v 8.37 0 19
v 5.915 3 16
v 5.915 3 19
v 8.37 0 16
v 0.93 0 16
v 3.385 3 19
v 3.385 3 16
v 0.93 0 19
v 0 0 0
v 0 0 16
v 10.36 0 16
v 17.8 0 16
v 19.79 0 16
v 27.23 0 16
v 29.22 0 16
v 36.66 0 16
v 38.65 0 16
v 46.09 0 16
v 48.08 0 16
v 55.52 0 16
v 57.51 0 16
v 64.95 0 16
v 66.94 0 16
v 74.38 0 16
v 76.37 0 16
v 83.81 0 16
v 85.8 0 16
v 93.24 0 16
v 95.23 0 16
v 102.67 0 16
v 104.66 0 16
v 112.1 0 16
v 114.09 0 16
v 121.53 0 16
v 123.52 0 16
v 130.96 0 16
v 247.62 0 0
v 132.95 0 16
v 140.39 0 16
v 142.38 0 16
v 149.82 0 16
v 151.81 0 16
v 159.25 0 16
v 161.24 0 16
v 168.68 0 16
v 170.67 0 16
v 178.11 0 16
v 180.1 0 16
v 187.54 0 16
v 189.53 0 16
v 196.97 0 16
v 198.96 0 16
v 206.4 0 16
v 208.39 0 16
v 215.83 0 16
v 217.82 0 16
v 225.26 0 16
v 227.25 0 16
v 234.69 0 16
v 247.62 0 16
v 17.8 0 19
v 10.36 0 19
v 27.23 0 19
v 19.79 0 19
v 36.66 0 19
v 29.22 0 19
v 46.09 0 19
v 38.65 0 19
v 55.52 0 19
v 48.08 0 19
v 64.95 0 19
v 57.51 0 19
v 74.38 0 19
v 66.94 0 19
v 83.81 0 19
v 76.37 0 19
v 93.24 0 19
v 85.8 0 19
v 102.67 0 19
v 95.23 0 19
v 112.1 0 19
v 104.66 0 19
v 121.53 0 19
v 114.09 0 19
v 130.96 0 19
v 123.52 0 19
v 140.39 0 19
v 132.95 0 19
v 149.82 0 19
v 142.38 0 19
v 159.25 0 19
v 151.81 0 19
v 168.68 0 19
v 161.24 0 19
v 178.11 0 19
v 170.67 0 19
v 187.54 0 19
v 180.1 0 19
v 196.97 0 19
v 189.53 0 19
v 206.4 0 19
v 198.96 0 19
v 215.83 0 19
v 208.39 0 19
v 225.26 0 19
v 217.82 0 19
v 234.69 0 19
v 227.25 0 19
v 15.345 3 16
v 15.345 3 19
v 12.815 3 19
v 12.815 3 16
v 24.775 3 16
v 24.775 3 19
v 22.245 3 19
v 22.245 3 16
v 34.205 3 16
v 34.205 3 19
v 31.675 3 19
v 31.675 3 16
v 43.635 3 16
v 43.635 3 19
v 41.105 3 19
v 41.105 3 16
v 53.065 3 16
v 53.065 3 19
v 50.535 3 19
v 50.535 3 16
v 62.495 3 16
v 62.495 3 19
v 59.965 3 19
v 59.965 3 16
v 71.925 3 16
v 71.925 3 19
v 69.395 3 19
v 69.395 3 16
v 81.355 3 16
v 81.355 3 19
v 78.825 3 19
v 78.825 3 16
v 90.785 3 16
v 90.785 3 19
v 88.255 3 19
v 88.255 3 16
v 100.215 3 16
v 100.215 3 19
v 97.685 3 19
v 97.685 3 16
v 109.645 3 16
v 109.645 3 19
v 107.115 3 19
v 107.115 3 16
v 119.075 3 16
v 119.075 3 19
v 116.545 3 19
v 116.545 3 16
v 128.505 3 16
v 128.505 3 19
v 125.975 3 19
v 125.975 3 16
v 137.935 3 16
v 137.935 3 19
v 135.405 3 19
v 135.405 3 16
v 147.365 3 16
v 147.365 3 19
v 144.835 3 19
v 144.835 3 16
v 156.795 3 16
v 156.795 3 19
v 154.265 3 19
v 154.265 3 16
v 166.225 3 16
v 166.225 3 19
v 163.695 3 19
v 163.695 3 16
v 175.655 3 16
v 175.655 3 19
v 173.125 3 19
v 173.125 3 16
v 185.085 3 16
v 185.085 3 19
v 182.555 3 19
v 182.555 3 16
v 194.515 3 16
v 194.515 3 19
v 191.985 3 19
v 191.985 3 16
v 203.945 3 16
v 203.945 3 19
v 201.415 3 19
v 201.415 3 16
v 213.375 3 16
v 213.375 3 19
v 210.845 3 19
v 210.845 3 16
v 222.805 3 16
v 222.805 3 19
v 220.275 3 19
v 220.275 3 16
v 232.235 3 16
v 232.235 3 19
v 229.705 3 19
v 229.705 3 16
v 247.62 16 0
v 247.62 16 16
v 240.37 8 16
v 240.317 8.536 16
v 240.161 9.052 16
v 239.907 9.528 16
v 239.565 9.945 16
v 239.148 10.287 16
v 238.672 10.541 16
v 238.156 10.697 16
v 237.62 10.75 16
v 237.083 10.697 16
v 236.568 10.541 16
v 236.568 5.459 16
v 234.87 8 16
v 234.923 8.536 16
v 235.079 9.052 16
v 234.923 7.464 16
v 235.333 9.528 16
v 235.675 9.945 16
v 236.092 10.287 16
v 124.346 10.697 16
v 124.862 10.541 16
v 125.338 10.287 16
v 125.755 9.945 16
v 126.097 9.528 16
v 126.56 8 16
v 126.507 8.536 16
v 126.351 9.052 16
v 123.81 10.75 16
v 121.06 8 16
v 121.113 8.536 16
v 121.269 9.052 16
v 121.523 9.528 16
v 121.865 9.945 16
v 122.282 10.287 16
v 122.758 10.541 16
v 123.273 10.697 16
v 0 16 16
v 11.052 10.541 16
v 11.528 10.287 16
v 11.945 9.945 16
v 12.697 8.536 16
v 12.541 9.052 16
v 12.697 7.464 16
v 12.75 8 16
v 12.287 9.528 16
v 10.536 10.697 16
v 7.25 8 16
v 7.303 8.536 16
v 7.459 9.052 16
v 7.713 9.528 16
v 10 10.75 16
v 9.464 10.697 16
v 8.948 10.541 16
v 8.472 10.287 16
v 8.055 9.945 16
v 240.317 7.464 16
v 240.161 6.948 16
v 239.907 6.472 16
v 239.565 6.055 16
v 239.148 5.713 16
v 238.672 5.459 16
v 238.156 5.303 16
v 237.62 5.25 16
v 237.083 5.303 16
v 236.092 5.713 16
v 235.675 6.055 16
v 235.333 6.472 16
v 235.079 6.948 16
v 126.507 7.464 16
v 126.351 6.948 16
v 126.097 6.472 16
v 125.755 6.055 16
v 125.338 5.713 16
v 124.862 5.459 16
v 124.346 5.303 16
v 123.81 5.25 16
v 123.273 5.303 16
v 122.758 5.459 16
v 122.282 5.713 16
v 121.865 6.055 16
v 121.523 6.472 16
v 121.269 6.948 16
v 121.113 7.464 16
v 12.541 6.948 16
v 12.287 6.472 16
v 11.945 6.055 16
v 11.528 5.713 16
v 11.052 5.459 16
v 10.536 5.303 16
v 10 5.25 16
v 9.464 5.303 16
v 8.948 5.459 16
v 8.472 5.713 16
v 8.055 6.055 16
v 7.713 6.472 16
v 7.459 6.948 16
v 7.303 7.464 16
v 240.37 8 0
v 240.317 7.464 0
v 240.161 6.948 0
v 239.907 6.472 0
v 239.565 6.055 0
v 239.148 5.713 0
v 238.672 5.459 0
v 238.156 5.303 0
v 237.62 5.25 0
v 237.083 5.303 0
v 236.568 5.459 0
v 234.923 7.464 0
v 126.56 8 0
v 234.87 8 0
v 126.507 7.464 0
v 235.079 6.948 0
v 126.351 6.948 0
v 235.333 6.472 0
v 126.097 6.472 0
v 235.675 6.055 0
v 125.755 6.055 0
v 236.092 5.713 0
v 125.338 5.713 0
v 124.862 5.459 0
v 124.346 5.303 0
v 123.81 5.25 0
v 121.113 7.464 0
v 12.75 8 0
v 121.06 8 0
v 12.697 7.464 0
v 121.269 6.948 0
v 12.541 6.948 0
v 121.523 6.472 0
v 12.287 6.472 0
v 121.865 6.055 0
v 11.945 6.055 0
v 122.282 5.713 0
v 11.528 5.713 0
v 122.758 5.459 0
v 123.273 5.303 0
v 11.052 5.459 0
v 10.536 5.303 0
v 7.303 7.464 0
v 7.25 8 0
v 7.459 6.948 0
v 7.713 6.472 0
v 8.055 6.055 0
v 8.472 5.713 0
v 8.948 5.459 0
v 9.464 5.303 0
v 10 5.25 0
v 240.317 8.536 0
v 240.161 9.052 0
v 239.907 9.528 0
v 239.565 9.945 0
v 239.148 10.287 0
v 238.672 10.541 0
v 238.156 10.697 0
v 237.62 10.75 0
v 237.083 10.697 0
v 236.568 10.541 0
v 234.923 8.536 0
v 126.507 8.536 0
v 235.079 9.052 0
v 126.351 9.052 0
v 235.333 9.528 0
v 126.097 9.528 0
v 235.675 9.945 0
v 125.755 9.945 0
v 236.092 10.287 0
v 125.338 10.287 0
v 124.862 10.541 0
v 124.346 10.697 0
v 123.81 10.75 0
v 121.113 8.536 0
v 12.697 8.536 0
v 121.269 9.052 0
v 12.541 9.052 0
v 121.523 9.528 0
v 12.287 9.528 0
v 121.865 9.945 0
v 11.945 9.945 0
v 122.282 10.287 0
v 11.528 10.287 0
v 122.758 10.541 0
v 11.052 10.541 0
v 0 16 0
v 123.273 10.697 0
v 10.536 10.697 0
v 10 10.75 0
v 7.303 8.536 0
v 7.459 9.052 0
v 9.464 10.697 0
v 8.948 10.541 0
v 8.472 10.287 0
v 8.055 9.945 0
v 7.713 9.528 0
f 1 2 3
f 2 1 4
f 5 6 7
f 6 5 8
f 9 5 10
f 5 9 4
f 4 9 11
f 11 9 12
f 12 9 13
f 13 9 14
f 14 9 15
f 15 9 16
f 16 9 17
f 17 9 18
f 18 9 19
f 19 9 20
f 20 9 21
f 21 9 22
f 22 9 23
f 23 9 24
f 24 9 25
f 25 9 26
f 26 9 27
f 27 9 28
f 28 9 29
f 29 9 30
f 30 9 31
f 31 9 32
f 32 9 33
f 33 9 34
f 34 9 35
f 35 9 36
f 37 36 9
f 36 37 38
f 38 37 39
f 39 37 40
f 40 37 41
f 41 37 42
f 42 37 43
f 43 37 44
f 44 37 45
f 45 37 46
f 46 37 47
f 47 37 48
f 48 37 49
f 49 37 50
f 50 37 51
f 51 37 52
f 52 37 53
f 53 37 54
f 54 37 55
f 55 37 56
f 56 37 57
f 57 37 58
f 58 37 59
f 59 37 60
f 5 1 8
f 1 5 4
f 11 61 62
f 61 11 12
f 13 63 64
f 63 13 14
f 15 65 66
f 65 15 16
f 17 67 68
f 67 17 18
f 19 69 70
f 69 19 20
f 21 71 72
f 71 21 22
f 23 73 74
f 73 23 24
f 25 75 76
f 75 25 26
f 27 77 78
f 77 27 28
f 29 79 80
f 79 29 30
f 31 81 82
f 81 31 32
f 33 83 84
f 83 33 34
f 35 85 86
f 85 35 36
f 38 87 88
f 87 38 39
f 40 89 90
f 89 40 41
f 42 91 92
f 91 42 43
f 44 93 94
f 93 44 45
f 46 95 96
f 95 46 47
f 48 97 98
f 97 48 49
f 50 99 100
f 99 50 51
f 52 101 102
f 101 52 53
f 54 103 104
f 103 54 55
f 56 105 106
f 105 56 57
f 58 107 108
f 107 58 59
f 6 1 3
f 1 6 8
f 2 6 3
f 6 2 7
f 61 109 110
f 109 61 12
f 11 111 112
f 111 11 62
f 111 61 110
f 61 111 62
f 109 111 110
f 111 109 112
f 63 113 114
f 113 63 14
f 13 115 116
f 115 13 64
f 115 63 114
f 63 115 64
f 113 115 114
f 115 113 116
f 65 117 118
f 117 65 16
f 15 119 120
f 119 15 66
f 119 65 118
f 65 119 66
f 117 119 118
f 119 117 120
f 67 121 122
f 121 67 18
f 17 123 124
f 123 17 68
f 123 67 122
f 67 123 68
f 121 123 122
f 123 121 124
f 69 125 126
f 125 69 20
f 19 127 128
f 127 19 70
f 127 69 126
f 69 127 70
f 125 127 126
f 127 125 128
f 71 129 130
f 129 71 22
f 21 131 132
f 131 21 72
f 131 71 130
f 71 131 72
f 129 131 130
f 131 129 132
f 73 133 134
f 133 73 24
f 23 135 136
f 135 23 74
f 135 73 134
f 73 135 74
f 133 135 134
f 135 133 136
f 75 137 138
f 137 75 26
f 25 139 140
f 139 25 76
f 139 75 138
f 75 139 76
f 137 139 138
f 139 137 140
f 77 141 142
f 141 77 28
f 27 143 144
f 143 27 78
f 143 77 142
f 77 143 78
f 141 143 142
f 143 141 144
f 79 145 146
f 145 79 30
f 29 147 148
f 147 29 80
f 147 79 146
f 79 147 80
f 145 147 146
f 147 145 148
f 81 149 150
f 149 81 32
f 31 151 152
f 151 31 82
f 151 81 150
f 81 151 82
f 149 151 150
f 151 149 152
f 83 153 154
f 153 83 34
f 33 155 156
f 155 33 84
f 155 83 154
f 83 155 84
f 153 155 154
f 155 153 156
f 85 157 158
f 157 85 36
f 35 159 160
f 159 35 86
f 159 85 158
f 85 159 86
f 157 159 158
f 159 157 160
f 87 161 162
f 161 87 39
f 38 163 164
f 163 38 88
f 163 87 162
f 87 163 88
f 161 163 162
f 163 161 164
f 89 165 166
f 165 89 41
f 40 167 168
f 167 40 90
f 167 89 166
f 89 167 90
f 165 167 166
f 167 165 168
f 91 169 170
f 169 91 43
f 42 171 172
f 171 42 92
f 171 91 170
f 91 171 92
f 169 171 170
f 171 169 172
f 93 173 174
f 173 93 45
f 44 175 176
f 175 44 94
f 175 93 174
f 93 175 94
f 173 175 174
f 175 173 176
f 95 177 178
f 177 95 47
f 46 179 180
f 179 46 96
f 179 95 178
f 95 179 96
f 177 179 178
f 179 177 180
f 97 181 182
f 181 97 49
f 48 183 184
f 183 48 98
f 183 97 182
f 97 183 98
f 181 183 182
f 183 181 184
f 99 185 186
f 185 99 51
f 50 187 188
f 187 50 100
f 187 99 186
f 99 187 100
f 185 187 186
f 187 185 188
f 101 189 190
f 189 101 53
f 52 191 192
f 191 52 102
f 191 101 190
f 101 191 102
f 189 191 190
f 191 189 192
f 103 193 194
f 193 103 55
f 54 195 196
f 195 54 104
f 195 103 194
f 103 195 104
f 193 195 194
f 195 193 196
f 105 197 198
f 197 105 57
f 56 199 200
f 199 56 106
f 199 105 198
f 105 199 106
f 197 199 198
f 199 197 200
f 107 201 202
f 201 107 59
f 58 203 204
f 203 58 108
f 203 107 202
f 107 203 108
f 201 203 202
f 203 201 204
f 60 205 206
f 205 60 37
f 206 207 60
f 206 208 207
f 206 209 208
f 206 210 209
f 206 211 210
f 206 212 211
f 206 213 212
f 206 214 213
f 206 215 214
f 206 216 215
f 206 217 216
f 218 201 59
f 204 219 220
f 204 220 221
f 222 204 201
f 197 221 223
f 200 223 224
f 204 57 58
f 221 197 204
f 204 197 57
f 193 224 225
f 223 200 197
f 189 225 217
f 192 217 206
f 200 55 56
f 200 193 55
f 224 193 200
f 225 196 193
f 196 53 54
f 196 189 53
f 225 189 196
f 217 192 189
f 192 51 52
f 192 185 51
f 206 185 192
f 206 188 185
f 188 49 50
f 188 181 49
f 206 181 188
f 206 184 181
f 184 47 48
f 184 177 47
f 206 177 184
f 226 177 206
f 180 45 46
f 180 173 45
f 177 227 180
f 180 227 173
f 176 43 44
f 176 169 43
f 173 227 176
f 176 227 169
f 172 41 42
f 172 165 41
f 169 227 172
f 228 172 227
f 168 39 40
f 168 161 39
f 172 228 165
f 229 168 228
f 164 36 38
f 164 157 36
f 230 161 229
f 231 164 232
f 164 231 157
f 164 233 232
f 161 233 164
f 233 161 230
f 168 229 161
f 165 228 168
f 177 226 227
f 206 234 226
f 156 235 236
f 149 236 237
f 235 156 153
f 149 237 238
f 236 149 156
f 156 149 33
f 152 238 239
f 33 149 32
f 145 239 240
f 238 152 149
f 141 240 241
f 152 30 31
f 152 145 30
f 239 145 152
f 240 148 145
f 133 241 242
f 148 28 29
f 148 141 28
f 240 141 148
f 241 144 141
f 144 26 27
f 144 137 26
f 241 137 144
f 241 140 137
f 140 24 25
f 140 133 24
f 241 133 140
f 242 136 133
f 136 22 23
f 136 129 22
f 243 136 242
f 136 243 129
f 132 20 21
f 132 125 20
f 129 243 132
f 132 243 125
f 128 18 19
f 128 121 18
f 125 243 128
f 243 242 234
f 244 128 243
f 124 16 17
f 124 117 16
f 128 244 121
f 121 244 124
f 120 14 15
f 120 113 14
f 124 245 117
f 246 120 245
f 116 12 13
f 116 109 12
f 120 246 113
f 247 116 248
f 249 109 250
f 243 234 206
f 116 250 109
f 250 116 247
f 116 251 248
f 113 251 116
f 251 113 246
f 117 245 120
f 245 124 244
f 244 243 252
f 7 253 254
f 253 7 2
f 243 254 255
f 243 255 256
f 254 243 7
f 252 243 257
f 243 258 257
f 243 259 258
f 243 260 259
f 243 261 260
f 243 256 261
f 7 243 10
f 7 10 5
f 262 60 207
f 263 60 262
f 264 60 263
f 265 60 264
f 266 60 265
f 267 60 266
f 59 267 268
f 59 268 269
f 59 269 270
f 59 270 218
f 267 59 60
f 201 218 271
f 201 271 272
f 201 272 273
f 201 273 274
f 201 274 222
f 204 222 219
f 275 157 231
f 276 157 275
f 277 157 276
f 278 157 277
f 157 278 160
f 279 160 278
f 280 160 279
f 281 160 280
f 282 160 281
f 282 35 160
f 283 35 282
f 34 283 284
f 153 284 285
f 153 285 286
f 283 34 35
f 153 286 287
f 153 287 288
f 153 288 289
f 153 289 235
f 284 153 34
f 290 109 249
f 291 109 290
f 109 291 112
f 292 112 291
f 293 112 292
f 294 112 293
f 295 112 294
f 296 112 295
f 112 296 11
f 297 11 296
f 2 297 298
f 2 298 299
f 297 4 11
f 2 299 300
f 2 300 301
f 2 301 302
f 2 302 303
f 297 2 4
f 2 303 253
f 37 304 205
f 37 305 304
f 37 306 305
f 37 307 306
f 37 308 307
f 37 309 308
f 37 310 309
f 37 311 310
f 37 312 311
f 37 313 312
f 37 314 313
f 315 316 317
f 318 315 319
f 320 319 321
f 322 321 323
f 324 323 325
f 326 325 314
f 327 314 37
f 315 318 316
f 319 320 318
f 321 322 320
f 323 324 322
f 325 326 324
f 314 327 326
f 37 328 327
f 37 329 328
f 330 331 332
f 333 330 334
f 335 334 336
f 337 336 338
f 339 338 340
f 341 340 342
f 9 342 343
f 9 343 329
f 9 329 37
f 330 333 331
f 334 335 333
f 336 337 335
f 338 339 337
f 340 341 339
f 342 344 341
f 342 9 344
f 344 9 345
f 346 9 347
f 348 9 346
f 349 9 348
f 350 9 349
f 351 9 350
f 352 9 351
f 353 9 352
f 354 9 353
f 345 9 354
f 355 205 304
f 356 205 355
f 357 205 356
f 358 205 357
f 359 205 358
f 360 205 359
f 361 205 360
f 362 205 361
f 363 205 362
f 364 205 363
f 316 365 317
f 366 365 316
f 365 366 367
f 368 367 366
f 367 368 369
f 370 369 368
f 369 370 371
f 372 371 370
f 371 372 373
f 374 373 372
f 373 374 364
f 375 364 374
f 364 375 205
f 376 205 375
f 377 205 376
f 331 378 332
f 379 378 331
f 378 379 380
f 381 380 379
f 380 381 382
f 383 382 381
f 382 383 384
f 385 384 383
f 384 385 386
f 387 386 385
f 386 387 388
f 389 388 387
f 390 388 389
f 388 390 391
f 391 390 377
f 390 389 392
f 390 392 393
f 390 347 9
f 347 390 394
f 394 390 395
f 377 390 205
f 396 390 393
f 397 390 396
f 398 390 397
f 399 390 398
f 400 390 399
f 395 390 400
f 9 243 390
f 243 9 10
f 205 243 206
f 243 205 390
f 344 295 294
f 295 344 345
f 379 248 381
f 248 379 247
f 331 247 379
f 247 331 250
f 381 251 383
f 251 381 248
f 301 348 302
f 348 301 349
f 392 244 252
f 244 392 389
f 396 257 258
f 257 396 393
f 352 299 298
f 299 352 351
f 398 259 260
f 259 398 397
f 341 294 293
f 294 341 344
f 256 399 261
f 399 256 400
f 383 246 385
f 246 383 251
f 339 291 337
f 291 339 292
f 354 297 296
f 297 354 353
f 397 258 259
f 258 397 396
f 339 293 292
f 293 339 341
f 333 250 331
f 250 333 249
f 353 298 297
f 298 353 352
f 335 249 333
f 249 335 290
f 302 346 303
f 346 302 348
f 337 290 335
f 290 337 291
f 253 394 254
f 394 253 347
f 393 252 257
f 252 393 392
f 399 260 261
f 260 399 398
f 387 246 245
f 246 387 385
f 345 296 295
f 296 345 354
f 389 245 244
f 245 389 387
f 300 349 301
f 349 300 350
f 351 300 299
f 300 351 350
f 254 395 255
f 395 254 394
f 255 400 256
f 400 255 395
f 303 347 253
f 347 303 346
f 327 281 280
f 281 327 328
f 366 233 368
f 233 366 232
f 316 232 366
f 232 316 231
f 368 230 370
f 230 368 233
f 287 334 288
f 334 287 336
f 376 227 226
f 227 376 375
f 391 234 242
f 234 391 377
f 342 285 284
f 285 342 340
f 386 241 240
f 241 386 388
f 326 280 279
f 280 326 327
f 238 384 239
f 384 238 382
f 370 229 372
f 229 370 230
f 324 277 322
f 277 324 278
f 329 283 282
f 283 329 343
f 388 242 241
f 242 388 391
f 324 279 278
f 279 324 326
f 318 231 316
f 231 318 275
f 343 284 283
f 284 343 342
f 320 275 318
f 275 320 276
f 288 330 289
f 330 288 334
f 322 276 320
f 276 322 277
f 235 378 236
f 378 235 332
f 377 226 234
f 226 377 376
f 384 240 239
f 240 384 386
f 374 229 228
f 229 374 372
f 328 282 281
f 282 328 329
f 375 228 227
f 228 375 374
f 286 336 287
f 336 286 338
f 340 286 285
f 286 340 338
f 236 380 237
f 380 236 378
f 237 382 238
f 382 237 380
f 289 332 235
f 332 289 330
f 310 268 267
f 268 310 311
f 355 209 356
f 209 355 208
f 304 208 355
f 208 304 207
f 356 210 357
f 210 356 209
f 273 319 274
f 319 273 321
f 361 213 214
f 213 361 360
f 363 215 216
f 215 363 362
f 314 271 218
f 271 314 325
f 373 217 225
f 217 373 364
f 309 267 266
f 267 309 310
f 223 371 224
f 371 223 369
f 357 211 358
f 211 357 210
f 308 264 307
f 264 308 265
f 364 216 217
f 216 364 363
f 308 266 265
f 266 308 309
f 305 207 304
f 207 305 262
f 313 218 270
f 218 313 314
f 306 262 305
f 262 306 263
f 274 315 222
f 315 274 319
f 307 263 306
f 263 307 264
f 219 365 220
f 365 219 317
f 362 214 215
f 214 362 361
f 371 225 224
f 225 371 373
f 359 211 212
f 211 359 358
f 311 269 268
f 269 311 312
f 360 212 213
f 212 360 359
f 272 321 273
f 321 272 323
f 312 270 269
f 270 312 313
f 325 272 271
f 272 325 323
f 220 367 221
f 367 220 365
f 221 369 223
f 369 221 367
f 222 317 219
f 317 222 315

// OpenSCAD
$fn = 32;

// ----------------------------------------------------------------------
// Gear rack: m=3 z=25, 247.62 x 16 x 19 mm
// ----------------------------------------------------------------------

// --- parameters (mm) ---
bar_len = 247.62;         // rack length, X
bar_w = 16;               // rack width, Y
bar_h = 19;               // overall height, Z
gear_module = 3;          // module
base_t = 16;              // tooth root line height
pitch = 9.43;             // circular pitch
tip_w = 2.53;             // tooth thickness at the tip
root_w = 7.44;            // tooth thickness at the root line
hole_d = 5.5;             // mounting hole
sink = 0.6;               // tooth root overlap into the body

tooth_span = 235.62;

module tooth(x0) {
  /* 20 deg flank profile, sunk into the body for a positive overlap */
  translate([x0, 0, base_t - sink])
    linear_extrude(height = bar_h - base_t + sink)
      polygon(points = [[-root_w / 2, 0], [root_w / 2, 0],
                        [tip_w / 2, bar_h - base_t],
                        [-tip_w / 2, bar_h - base_t]]);
}

difference() {
  union() {
    cube([bar_len, bar_w, base_t]);
    for (i = [0 : 25 - 1])
      tooth((i + 0.5) * pitch + (tooth_span - 25 * pitch) / 2);
  }
  translate([10, 8, -1]) cylinder(h = base_t + 2, d = hole_d);
  translate([123.81, 8, -1]) cylinder(h = base_t + 2, d = hole_d);
  translate([237.62, 8, -1]) cylinder(h = base_t + 2, d = hole_d);
}
